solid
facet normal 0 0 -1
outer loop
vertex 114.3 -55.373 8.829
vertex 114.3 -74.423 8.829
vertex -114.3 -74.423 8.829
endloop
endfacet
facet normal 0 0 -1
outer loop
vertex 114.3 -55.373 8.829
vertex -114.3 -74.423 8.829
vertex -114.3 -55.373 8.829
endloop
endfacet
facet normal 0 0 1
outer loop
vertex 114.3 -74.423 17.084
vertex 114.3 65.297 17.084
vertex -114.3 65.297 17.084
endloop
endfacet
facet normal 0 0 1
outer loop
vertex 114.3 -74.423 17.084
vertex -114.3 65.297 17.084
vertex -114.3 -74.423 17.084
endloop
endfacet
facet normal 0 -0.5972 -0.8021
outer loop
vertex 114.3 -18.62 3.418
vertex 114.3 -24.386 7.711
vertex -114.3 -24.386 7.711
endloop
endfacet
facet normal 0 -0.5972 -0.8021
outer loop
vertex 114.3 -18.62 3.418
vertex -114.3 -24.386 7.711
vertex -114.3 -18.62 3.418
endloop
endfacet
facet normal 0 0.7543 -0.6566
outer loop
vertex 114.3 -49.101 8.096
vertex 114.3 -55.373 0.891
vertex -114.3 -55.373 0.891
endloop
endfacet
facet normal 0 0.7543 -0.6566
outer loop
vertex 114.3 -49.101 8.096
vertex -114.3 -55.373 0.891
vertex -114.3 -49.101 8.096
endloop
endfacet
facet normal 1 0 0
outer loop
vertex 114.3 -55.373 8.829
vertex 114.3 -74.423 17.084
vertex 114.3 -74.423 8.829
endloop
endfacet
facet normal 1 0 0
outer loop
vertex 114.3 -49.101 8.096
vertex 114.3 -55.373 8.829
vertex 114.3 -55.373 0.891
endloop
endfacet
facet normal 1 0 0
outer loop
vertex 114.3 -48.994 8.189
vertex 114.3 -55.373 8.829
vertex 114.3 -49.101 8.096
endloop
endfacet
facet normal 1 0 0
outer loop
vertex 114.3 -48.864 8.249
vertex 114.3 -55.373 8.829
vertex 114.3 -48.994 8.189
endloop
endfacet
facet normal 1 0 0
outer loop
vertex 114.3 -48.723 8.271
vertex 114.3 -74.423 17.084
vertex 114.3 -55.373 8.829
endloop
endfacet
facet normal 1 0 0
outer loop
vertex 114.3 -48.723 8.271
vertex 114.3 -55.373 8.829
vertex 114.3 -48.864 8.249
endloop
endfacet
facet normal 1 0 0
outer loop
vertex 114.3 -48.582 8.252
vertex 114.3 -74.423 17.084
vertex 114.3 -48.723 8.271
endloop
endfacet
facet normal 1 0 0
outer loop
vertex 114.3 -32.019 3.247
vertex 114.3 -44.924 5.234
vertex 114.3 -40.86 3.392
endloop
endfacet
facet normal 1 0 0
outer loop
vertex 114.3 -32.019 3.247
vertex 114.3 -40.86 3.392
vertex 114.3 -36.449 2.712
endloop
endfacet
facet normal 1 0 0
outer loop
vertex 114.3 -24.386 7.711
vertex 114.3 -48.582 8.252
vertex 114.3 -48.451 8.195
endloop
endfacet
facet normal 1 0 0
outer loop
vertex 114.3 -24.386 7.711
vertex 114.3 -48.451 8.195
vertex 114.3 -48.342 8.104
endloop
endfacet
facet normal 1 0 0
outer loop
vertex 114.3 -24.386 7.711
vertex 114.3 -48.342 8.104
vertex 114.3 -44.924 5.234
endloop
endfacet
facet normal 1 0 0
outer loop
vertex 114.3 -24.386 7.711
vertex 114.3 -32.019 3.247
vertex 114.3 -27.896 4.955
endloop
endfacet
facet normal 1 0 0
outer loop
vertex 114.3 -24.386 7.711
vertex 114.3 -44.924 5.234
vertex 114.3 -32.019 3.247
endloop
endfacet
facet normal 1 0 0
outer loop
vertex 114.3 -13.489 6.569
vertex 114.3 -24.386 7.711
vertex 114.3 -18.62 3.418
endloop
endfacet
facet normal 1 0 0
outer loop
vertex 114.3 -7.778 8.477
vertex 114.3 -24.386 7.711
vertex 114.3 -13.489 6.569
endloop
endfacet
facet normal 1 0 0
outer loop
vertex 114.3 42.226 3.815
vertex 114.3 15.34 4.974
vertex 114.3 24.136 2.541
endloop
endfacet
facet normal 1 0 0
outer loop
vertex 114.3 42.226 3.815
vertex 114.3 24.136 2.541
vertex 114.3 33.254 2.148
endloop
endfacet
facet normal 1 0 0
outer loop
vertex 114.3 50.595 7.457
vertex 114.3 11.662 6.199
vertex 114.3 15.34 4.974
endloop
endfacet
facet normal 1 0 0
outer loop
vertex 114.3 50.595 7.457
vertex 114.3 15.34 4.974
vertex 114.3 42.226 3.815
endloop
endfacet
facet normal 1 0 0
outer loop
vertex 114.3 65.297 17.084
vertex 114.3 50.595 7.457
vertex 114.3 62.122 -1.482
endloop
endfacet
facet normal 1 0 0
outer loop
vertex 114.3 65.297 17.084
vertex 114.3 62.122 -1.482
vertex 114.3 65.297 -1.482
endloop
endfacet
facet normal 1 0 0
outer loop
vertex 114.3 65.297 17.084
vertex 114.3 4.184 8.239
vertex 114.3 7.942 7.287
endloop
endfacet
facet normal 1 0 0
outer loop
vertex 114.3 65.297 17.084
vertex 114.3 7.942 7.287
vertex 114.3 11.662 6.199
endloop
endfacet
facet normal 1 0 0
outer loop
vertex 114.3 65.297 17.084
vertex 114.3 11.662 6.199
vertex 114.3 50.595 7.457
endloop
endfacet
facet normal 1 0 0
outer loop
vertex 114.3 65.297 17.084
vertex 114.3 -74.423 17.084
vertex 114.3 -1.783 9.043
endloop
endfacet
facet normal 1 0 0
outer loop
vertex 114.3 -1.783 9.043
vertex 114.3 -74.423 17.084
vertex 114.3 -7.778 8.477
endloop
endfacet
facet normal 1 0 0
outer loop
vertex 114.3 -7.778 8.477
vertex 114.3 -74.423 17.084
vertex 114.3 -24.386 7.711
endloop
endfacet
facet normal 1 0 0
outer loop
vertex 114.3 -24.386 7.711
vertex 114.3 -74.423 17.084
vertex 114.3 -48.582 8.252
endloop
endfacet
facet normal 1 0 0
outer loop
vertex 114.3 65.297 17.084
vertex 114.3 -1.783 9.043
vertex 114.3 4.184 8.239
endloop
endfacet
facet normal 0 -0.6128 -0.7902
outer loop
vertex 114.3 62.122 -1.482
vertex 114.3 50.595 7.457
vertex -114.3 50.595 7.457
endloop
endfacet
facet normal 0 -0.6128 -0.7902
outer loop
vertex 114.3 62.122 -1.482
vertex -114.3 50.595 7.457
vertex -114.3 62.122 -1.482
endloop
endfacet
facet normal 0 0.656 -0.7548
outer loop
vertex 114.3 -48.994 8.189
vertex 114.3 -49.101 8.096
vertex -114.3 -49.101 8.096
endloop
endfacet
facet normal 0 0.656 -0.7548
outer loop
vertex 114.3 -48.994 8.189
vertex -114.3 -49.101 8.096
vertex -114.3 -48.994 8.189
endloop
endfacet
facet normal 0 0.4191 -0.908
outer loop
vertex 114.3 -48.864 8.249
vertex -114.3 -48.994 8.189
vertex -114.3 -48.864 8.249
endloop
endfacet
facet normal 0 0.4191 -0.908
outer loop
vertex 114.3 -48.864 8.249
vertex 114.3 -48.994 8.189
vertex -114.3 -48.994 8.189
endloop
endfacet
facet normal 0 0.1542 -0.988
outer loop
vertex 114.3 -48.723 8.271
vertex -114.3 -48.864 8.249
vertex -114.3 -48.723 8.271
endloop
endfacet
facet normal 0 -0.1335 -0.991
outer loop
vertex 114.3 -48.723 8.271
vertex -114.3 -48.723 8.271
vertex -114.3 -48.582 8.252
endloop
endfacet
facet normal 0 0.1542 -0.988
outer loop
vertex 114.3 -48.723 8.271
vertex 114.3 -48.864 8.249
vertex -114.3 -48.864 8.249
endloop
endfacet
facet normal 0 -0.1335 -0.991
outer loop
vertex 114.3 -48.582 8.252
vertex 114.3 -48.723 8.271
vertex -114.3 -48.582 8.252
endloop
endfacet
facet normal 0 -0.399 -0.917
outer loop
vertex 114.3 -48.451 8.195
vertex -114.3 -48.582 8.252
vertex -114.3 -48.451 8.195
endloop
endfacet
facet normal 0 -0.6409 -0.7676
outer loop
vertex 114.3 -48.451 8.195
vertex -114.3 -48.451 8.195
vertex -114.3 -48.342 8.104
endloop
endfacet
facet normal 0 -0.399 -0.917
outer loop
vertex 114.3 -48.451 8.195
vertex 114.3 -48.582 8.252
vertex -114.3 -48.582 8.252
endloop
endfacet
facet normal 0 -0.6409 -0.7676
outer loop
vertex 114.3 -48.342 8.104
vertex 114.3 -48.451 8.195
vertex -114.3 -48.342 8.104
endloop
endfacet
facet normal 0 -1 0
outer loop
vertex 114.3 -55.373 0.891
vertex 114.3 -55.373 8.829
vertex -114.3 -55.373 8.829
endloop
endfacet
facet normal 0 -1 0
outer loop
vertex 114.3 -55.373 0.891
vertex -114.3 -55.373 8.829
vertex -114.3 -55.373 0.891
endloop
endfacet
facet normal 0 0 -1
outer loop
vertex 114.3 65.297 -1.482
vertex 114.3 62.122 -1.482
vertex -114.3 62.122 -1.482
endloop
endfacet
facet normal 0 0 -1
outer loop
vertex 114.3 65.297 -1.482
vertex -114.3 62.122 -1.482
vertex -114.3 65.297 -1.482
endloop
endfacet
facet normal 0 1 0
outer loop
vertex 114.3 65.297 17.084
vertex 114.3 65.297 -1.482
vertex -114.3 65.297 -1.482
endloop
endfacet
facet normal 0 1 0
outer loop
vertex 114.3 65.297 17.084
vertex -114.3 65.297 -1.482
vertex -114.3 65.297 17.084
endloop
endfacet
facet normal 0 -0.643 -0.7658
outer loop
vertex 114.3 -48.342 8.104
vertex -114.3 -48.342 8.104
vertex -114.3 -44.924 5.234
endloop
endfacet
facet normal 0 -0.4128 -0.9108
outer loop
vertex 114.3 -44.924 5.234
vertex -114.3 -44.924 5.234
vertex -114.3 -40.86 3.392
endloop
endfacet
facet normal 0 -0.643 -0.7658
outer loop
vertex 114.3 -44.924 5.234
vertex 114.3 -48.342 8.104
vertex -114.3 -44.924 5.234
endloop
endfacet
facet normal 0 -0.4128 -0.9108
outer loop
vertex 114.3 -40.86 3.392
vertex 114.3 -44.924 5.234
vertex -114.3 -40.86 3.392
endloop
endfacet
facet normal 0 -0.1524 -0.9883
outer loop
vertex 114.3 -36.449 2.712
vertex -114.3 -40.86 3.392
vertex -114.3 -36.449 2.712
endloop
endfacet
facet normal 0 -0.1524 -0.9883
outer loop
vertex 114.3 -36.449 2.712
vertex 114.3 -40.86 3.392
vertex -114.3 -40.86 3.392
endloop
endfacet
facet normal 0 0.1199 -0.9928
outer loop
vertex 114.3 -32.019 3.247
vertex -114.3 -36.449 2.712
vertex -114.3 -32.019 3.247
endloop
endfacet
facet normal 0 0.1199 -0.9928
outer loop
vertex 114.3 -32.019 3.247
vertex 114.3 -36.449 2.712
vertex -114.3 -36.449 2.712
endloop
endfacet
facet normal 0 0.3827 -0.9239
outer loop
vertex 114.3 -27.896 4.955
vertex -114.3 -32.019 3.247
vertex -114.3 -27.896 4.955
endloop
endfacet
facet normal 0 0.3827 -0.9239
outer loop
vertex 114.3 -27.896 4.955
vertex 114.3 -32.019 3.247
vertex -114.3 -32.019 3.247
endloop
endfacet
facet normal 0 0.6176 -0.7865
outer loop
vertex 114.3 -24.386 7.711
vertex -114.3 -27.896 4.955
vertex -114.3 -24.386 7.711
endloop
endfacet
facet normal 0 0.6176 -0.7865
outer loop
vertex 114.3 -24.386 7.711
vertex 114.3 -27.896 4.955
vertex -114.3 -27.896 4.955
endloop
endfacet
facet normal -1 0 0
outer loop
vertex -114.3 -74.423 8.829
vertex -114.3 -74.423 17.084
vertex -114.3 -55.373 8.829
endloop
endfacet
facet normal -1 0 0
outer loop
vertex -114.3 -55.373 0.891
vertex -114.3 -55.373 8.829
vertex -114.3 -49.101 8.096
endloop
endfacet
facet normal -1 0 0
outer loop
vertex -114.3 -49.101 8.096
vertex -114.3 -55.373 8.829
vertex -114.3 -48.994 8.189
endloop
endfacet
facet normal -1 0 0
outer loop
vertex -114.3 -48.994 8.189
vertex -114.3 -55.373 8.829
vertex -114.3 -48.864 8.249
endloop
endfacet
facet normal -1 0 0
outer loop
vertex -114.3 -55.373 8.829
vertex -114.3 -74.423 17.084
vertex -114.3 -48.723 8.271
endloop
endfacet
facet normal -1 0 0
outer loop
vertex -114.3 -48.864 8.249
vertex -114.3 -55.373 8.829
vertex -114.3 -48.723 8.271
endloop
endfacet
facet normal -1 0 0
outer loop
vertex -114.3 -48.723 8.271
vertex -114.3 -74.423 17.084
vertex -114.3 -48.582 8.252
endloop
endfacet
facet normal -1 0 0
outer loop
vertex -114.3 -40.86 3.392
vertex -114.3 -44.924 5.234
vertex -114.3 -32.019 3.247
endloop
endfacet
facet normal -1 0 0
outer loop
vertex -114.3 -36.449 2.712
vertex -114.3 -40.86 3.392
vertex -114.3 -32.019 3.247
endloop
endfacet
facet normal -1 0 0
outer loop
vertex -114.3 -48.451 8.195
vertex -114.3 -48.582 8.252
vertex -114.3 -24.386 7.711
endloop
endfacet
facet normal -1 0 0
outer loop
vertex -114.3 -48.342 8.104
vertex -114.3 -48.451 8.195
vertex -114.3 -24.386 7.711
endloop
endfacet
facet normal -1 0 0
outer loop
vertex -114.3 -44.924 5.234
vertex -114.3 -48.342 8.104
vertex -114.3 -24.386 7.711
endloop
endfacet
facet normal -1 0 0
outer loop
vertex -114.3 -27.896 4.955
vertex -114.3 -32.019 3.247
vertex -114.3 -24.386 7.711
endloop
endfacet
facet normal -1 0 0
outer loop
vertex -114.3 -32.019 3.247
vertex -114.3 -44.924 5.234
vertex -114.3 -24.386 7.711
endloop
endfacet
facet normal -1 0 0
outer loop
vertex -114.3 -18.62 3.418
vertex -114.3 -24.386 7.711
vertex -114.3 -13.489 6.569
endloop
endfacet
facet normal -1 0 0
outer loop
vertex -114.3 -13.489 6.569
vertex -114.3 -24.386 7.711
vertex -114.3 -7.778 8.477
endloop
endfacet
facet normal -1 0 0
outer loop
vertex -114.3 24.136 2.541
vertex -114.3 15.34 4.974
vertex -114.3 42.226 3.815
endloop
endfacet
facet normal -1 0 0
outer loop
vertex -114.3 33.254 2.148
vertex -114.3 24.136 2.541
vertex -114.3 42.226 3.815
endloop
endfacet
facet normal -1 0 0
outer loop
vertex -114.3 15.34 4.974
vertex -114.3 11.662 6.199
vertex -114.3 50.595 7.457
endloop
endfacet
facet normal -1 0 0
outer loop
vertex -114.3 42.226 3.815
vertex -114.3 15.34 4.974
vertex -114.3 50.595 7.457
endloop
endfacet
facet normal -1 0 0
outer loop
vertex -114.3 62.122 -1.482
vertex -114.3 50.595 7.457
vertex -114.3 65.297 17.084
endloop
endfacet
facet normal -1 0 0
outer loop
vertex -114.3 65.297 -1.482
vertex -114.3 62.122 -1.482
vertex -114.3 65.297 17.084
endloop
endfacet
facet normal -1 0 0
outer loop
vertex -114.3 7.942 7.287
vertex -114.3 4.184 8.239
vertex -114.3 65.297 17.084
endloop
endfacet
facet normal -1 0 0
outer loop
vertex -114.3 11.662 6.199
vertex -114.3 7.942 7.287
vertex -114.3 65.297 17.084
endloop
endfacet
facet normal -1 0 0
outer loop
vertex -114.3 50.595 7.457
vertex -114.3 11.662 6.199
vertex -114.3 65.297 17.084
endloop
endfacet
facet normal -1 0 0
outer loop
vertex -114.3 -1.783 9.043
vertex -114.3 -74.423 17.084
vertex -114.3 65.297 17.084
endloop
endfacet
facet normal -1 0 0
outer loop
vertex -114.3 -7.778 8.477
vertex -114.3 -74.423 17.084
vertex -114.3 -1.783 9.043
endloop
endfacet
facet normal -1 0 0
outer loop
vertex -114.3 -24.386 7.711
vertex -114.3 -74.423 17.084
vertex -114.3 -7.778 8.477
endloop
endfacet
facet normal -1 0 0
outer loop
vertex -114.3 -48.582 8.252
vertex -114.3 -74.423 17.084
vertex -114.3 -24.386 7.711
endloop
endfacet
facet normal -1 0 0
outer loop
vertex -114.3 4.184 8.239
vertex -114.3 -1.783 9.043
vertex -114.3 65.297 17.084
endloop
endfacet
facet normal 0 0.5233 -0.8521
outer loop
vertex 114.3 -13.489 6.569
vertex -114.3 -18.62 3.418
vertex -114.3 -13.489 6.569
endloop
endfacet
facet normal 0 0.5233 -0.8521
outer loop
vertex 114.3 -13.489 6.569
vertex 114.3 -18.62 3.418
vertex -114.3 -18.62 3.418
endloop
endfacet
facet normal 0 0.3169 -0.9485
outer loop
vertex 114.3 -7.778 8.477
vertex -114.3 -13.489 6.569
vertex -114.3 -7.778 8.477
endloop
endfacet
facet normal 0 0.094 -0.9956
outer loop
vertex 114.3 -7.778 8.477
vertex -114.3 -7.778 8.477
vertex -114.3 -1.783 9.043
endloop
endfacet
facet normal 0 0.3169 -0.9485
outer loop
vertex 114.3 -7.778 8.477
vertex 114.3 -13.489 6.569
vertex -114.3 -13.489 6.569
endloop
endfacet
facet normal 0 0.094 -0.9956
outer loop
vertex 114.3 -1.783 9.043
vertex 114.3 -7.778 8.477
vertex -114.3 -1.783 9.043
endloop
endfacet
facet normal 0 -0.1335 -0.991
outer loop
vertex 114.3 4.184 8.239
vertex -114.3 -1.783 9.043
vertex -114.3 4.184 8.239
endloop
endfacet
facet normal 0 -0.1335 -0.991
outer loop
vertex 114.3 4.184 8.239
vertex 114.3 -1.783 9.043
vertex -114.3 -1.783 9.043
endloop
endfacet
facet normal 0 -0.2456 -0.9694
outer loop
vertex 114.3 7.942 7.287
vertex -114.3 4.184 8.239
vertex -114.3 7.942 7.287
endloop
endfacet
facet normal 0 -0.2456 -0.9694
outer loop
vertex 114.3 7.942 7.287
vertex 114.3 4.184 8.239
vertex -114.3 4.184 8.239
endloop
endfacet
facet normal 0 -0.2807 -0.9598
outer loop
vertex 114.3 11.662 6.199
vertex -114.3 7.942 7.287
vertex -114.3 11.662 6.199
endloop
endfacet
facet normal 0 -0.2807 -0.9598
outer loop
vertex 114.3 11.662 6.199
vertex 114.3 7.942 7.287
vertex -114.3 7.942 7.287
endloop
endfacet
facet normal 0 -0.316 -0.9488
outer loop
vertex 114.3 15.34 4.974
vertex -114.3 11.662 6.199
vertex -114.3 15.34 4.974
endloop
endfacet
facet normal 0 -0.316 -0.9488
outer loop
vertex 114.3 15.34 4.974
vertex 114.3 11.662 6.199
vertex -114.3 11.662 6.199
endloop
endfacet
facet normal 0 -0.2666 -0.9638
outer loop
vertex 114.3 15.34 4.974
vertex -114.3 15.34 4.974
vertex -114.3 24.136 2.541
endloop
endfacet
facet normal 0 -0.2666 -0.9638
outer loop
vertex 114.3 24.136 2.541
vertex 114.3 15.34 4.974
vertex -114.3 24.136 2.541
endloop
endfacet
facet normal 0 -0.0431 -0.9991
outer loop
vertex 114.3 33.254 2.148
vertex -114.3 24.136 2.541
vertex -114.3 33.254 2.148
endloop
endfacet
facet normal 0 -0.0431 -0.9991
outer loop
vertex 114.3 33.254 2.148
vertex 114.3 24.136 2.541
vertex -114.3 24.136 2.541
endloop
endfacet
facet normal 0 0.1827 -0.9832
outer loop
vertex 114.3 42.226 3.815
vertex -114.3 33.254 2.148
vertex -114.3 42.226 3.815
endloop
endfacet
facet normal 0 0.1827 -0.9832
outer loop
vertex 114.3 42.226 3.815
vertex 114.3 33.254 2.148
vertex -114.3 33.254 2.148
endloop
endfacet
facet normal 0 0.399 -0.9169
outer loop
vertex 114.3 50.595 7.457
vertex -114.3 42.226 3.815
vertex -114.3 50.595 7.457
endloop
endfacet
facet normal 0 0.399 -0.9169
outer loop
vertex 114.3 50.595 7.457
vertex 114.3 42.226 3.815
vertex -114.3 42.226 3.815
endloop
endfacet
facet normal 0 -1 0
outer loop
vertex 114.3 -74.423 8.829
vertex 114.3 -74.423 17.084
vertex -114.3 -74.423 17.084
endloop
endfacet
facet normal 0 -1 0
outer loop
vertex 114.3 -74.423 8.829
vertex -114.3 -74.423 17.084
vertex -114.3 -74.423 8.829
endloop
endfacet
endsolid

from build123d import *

# Parameters (mm, degrees)
F1_DEPTH = 114.3
F2_DEPTH = 114.3


with BuildPart() as f1:
    # F0 (on Right) → F1 (new body)
    with BuildSketch(Plane.YZ):
        with BuildLine():
            ThreePointArc((15.3397259396, 4.9735903311), (33.2535851209, 2.1483766452), (50.5945171187, 7.4568849653))
            Line((50.5945171187, 7.4568849653), (62.121764605, -1.4823092679))
            Line((62.121764605, -1.4823092679), (65.296764605, -1.4823092679))
            Line((65.296764605, -1.4823092679), (65.296764605, 17.0836517627))
            Line((65.296764605, 17.0836517627), (-74.4234208748, 17.0836517627))
            Line((-74.4234208748, 17.0836517627), (-74.4234208748, 8.8286517627))
            Line((-74.4234208748, 8.8286517627), (-55.3734208748, 8.8286517627))
            Line((-55.3734208748, 8.8286517627), (-55.3734208748, 0.8911517627))
            Line((-55.3734208748, 0.8911517627), (-49.1014425221, 8.0960725076))
            ThreePointArc((-49.1014425221, 8.0960725076), (-48.7232814382, 8.2705023504), (-48.3417610399, 8.1035479821))
            ThreePointArc((-48.3417610399, 8.1035479821), (-36.4490241706, 2.7123313027), (-24.3859868745, 7.7108849653))
            Line((-24.3859868745, 7.7108849653), (-18.6202428219, 3.4182849653))
            ThreePointArc((-18.6202428219, 3.4182849653), (-7.7779010166, 8.4768928848), (4.1840897409, 8.2388445204))
            ThreePointArc((4.1840897409, 8.2388445204), (9.8069500348, 6.7601026388), (15.3397259396, 4.9735903311))
        make_face()
    extrude(amount=F1_DEPTH)

    # F2 (add): a face of the model
    f2_faces = [f1.faces().sort_by_distance(p)[0] for p in [
        (0, 0.4923148954, 10.8715185192),
    ]]
    extrude(f2_faces, amount=F2_DEPTH)


solid = f1.part
